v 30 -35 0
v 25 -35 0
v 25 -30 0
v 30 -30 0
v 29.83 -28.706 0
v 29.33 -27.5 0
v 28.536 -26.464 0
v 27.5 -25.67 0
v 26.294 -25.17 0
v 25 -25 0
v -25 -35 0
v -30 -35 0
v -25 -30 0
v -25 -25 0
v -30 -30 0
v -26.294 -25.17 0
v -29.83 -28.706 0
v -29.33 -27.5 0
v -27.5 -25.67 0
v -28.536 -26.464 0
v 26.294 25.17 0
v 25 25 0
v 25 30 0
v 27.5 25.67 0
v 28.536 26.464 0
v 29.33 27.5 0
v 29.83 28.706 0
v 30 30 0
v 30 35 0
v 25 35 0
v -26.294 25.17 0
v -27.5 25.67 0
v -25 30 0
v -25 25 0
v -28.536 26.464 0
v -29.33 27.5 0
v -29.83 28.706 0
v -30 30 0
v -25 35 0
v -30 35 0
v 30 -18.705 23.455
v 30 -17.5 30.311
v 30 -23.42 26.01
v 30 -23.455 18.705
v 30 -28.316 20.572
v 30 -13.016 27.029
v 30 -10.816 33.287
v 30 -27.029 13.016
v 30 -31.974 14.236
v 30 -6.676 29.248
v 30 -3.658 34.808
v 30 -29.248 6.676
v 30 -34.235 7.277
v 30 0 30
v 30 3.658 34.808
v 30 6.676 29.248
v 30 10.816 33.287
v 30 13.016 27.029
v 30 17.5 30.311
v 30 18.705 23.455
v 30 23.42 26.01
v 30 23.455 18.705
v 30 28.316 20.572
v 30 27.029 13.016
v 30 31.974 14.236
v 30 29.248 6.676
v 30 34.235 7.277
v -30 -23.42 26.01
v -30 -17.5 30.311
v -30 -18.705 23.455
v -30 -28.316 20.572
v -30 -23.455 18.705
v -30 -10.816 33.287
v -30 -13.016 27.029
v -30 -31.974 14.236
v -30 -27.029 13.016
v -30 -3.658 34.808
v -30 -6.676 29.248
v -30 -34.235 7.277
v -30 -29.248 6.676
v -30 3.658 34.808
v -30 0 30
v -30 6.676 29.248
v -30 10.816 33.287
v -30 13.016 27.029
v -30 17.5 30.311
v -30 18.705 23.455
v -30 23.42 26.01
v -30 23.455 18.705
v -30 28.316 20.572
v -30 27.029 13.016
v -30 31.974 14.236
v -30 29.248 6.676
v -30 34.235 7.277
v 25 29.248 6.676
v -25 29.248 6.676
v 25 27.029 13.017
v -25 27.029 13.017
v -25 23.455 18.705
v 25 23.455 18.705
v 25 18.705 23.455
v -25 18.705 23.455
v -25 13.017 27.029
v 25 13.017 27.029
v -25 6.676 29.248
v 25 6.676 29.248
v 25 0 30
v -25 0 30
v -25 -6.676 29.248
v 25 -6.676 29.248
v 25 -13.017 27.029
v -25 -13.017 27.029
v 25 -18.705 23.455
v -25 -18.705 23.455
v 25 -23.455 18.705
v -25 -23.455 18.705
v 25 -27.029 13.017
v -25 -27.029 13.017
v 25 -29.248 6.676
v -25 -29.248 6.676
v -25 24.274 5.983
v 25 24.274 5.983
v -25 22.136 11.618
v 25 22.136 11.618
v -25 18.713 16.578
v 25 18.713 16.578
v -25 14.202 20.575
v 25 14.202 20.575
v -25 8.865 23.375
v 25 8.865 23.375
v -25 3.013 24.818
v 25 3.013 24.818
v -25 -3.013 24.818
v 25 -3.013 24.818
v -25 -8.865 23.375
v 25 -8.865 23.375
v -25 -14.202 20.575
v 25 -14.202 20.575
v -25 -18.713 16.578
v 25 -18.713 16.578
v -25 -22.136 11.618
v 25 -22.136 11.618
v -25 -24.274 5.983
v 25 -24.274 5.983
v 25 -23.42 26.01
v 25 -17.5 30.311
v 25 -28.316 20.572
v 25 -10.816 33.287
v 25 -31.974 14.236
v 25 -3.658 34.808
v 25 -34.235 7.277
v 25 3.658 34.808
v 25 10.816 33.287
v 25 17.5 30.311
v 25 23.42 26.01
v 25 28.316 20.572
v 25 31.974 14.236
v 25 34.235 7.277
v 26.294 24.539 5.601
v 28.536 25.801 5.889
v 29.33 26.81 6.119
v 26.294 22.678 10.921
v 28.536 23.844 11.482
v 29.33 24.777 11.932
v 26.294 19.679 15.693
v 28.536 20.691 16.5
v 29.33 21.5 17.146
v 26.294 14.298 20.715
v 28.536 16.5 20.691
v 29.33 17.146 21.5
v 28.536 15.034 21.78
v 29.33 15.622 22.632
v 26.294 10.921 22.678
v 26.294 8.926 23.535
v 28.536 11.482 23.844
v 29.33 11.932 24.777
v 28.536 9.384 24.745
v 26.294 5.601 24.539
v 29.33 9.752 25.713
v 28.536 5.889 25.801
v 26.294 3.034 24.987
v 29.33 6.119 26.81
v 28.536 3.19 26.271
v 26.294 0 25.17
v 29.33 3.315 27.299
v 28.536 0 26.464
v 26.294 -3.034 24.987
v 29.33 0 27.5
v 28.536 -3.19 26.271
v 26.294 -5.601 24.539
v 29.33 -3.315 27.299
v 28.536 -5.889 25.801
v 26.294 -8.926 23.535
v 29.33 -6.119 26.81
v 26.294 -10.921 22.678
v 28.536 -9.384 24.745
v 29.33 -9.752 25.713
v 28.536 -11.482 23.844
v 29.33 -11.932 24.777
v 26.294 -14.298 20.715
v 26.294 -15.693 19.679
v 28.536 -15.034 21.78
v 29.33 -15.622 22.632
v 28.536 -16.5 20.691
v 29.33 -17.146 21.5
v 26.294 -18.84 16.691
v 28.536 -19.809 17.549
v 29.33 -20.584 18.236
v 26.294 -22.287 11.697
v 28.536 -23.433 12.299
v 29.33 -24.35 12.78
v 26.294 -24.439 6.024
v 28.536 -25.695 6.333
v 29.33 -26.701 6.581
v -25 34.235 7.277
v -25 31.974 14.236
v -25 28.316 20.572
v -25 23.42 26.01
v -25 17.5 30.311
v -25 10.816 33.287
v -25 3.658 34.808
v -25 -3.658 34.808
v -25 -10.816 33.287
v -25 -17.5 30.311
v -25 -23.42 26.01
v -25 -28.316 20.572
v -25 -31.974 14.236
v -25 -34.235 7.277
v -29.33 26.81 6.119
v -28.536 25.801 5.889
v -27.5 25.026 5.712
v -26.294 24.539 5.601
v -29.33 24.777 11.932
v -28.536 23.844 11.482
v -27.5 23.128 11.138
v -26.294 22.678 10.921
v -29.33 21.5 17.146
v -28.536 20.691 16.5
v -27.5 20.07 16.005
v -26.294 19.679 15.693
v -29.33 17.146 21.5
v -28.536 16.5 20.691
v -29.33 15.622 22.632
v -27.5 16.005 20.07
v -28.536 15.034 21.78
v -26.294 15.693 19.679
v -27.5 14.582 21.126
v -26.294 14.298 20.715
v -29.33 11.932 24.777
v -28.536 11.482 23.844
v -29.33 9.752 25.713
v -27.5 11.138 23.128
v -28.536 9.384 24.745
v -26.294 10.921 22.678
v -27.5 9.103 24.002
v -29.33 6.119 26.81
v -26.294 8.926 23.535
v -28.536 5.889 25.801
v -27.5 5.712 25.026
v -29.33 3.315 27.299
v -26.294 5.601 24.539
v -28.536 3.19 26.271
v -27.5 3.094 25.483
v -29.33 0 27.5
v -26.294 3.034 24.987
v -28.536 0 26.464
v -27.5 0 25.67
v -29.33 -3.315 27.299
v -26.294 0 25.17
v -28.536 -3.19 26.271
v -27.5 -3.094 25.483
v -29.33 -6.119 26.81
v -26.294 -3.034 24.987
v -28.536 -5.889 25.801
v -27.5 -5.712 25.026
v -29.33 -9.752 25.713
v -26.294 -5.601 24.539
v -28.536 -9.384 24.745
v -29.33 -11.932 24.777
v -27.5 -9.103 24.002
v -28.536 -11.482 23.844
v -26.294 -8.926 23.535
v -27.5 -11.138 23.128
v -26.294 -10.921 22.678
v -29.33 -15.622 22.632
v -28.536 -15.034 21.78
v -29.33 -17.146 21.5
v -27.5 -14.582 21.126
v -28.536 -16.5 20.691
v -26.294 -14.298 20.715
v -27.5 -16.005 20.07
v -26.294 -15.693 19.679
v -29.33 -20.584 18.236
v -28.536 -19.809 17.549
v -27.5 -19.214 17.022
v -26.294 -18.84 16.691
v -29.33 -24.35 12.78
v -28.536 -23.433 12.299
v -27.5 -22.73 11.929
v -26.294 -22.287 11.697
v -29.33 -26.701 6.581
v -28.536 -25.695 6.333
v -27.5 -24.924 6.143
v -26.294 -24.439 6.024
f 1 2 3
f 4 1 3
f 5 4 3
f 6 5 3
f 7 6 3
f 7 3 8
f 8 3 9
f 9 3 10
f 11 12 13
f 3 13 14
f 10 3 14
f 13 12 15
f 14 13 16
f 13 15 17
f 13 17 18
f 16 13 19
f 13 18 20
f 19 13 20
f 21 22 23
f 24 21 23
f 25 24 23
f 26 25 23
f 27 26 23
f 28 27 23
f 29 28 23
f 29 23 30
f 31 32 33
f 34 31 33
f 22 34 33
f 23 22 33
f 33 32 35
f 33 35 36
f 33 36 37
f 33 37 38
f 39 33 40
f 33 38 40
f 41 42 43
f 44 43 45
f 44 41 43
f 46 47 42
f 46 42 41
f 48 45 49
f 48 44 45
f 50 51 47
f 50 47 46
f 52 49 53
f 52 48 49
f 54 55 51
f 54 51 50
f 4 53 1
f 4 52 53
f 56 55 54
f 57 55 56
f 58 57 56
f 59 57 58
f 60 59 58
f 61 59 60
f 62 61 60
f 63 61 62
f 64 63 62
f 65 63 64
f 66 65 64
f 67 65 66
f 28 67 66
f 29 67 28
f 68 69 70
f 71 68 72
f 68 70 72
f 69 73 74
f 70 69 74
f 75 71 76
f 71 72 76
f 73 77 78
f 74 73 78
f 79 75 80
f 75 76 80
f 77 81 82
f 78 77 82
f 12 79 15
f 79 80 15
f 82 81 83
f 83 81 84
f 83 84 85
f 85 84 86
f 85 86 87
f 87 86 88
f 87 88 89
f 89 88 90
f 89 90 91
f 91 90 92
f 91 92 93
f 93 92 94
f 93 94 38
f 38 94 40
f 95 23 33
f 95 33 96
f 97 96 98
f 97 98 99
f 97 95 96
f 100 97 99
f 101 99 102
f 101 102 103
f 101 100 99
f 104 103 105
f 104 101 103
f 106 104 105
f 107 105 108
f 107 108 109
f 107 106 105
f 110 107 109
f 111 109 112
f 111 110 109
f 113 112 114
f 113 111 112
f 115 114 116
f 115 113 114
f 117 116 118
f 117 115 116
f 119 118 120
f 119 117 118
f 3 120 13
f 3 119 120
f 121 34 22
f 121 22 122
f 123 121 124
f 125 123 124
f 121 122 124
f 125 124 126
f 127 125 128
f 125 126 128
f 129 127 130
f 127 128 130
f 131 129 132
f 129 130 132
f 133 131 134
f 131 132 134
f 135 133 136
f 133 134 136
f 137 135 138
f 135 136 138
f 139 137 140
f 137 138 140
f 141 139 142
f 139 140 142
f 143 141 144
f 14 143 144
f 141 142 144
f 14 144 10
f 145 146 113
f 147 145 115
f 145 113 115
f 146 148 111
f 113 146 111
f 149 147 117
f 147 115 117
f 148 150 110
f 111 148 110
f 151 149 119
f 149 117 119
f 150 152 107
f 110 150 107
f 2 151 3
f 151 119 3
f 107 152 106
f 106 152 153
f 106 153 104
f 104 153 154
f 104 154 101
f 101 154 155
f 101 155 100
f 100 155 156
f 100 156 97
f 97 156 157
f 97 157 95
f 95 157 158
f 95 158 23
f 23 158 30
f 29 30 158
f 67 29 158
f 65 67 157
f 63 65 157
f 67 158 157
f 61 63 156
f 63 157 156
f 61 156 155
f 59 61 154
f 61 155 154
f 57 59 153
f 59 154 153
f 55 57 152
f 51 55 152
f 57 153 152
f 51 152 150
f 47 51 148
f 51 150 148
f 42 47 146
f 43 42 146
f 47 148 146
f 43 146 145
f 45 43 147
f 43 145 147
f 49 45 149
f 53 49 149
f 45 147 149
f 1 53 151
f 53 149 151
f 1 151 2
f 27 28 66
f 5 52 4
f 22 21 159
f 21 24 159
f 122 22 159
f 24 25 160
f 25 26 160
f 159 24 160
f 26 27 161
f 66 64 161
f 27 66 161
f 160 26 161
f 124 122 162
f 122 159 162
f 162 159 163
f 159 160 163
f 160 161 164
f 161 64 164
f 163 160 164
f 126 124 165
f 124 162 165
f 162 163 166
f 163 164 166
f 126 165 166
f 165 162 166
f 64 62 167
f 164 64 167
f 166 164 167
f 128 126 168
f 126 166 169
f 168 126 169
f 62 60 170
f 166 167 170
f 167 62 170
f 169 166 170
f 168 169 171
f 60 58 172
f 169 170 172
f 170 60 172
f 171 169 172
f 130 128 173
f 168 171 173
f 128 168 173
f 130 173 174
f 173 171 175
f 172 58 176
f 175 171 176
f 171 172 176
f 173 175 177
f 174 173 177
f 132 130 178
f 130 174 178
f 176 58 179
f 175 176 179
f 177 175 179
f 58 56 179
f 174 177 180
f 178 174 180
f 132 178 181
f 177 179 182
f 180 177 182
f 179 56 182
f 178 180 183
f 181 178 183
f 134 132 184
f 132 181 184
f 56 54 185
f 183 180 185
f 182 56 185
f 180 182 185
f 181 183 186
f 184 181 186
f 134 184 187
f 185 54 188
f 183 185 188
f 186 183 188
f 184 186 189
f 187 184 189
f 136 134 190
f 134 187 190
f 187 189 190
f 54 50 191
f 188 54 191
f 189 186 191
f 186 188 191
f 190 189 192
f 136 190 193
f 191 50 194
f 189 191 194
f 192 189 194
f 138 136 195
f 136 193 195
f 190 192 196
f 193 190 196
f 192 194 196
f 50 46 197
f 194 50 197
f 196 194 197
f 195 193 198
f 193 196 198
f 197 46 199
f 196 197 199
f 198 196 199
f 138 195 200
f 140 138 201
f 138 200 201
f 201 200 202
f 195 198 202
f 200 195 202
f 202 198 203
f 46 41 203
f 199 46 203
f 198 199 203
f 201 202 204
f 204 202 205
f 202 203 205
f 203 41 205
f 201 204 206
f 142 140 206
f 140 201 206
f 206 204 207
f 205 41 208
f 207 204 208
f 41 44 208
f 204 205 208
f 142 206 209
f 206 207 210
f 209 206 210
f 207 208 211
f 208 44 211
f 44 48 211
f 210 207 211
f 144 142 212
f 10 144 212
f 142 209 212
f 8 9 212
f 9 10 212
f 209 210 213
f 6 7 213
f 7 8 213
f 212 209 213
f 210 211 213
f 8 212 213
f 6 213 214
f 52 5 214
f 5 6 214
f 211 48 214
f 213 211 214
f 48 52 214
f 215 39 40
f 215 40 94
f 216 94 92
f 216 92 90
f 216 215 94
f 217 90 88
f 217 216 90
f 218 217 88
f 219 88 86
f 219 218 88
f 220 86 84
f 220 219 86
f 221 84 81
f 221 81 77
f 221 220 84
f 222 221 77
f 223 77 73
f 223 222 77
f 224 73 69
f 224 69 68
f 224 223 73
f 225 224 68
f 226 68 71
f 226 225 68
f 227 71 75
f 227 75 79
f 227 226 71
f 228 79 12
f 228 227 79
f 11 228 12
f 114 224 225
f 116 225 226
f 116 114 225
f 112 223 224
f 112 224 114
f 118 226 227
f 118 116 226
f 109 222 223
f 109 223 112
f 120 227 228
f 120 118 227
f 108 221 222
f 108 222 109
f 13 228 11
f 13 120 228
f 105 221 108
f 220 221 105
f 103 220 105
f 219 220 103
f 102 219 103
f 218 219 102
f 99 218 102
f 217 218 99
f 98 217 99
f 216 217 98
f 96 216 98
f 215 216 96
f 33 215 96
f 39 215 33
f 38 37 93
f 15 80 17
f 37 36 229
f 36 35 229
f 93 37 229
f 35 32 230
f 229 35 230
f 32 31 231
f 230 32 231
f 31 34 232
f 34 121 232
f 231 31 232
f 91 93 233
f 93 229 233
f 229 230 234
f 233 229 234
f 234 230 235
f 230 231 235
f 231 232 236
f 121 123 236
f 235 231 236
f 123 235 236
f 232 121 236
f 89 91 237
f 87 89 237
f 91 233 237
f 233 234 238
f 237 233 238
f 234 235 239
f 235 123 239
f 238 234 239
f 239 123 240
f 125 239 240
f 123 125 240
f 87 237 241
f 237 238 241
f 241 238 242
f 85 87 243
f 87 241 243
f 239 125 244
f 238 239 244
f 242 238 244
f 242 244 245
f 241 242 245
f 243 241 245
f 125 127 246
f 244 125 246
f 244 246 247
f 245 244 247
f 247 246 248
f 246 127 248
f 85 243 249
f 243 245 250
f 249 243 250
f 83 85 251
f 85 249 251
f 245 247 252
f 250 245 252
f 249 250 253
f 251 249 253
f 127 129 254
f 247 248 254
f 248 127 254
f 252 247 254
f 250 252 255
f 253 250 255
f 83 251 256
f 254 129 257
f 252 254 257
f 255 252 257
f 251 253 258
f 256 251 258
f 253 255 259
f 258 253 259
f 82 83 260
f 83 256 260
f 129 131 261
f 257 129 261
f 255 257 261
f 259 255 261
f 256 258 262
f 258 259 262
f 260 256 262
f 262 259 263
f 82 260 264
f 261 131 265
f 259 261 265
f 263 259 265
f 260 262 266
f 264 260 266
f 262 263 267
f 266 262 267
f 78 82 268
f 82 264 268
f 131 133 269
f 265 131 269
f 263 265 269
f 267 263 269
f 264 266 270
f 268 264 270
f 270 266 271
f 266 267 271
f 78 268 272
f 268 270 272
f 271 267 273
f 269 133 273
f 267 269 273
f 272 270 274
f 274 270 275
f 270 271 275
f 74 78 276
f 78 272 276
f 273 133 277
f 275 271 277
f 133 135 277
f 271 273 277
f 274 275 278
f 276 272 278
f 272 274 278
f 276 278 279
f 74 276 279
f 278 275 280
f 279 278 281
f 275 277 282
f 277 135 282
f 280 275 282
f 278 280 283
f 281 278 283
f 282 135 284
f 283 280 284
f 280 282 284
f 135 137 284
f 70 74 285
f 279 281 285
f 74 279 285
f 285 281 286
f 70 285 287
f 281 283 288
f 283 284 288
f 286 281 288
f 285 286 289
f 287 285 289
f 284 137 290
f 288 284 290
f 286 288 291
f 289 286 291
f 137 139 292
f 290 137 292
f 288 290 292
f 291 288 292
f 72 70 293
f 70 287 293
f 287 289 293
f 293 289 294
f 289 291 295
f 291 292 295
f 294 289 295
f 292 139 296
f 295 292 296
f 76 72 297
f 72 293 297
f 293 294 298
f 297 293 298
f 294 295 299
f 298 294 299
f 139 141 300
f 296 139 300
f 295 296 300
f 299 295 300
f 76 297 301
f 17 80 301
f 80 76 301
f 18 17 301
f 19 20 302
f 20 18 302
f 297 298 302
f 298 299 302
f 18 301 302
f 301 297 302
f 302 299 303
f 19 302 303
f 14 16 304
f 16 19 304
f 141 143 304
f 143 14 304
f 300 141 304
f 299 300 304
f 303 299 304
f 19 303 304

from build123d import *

# Parameters (mm, degrees)
SKETCH1_R               = 30
SKETCH1_R_2             = 25
BOSS_EXTRUDE1_DEPTH     = 25
SKETCH2_R               = 35
SKETCH2_R_2             = 25
BOSS_EXTRUDE2_DEPTH     = 5
FILLET1_R               = 5
CUT_EXTRUDE1_DEPTH      = 78.781745931
CUT_EXTRUDE1_DEPTH_BACK = 78.781745931
SKETCH3_W               = 61.025724242
SKETCH3_H               = 108.223839892


with BuildPart() as part:
    # Sketch1 → Boss-Extrude1 (new, symmetric)
    with BuildSketch(Plane(origin=(0, 0, 0), x_dir=(0, 0, -1), z_dir=(1, 0, 0))):
        Circle(SKETCH1_R)
        Circle(SKETCH1_R_2, mode=Mode.SUBTRACT)
    extrude(amount=BOSS_EXTRUDE1_DEPTH, both=True)

    # Sketch2 → Boss-Extrude2 (add)
    with BuildSketch(Plane(origin=(25, 0, 0), x_dir=(0, 0, -1), z_dir=(1, 0, 0))):
        Circle(SKETCH2_R)
        Circle(SKETCH2_R_2, mode=Mode.SUBTRACT)
    boss_extrude2 = extrude(amount=BOSS_EXTRUDE2_DEPTH)

    # Mirror3: Boss-Extrude2 across plane
    add(boss_extrude2.mirror(Plane(origin=(0, 0, 0), x_dir=(0, 0, 1), z_dir=(1, 0, 0))))

    # Fillet1
    fillet1_edges = [part.edges().sort_by_distance(p)[0] for p in [
        (30, 0, 25),
        (-30, 0, 25),
    ]]
    fillet(fillet1_edges, radius=FILLET1_R - 0.0001)  # a hair under: the kernel refuses the full size

    # Sketch3 → Cut-Extrude1 (cut, two sides: drawn at the far end of the back side and taken through both)
    with BuildSketch(Plane(origin=(30, 0, 0), x_dir=(0, 0, -1), z_dir=(1, 0, 0)).offset(-CUT_EXTRUDE1_DEPTH_BACK)):
        with Locations((30.512862121, 2.693719616)):
            Rectangle(SKETCH3_W, SKETCH3_H)
    extrude(amount=CUT_EXTRUDE1_DEPTH + CUT_EXTRUDE1_DEPTH_BACK, mode=Mode.SUBTRACT)


solid = part.part
